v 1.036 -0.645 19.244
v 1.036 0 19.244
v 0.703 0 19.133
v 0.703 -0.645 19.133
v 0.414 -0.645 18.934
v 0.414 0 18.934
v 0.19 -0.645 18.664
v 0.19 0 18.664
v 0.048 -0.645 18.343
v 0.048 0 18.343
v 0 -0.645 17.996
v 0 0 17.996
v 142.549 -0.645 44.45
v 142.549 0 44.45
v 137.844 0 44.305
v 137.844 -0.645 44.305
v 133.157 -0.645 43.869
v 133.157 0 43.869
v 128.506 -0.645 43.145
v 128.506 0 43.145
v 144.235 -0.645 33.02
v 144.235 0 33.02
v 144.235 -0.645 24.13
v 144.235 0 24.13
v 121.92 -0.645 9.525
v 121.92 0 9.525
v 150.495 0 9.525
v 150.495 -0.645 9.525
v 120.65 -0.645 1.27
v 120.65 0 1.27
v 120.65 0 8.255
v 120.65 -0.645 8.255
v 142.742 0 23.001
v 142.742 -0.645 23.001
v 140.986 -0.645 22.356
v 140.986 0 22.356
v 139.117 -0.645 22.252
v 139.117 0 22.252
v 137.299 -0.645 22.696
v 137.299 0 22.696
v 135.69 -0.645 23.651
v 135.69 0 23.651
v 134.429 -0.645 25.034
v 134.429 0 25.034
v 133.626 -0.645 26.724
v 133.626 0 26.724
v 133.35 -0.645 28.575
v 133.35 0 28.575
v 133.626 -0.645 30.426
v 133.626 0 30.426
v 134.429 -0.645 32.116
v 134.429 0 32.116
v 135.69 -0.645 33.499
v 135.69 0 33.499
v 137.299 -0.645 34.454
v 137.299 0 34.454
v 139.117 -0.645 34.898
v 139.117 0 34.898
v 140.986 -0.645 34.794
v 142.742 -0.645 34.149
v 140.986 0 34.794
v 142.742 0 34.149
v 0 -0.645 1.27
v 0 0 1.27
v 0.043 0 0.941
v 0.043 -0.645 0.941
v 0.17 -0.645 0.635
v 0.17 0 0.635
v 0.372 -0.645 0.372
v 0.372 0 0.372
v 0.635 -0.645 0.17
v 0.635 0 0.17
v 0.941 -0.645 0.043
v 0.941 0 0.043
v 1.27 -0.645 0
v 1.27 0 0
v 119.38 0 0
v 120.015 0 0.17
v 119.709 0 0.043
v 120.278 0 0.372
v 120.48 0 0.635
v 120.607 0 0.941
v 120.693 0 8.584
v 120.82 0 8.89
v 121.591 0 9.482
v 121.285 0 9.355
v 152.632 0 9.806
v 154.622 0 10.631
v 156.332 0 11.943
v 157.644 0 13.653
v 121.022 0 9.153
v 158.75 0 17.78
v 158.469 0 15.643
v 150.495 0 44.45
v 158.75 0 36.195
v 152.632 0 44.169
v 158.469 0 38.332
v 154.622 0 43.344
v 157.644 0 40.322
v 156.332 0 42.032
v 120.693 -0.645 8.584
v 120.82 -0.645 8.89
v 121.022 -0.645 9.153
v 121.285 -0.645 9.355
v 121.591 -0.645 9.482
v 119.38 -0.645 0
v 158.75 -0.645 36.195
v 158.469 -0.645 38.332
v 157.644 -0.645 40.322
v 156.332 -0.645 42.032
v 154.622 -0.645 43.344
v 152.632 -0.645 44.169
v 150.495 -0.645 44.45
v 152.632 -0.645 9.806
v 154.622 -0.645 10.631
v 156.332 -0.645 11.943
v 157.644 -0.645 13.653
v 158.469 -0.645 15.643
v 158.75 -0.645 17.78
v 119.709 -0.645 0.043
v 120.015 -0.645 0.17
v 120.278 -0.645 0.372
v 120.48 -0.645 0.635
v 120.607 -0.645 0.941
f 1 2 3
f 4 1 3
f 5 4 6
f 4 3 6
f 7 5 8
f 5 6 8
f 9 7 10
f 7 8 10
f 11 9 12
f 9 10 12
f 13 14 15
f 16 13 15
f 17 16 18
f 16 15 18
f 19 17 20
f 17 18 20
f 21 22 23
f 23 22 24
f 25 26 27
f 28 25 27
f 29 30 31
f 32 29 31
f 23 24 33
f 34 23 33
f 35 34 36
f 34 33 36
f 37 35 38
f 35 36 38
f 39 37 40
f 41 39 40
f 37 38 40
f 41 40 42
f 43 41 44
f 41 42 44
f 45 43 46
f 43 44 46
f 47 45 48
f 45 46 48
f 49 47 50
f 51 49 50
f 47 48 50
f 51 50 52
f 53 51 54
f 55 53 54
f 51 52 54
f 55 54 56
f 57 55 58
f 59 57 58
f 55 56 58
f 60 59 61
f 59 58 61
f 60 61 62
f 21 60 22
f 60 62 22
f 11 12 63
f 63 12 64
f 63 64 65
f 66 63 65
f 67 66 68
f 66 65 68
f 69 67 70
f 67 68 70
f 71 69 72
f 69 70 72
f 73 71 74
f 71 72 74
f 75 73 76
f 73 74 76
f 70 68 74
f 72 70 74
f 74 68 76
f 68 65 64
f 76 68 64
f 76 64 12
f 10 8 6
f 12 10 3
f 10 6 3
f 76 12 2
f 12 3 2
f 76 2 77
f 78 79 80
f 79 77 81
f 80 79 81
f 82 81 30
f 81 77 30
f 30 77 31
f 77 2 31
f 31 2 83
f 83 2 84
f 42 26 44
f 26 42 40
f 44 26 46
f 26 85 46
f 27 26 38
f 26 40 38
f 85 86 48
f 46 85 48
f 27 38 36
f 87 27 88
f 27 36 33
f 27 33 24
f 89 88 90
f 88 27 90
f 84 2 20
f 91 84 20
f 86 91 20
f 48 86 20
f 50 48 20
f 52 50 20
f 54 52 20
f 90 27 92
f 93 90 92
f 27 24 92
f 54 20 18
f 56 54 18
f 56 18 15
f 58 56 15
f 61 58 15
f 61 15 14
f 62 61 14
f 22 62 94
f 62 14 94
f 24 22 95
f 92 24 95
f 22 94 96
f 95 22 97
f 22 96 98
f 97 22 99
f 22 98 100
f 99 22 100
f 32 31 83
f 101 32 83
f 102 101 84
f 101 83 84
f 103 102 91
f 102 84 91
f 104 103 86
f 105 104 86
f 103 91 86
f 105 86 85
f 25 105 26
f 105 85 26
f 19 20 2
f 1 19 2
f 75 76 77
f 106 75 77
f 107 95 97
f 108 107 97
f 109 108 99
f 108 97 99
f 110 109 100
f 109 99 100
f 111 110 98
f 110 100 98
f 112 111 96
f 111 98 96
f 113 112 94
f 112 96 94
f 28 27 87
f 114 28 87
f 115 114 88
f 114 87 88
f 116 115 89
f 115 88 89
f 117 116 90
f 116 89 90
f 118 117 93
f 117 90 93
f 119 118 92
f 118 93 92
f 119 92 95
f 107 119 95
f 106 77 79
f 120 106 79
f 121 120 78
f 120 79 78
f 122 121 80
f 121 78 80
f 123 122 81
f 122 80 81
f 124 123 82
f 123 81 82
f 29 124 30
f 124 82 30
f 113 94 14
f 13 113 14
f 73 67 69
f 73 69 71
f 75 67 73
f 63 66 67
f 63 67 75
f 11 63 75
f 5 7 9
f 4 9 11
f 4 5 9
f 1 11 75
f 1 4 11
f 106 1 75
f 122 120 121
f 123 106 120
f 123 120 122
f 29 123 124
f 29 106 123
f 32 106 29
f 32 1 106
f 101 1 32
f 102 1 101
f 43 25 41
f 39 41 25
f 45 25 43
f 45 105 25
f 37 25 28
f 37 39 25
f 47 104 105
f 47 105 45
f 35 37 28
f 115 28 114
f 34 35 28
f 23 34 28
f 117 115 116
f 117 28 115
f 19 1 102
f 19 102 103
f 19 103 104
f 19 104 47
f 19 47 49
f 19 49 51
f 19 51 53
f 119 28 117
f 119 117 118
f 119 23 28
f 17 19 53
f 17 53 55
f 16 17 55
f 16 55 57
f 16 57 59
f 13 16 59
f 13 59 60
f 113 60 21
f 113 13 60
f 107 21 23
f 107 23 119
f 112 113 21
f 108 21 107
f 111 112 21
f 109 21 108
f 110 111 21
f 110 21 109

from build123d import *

# Parameters (mm, degrees)
F1_DEPTH = 0.64516


with BuildPart() as f1:
    # F0 (on Front) → F1 (new body)
    with BuildSketch(Plane.XZ):
        with BuildLine():
            ThreePointArc((0, 1.27), (0.371974, 0.371974), (1.27, 0))
            Line((1.27, 0), (119.38, 0))
            ThreePointArc((119.38, 0), (120.278026, 0.371974), (120.65, 1.27))
            Line((120.65, 1.27), (120.65, 8.255))
            ThreePointArc((120.65, 8.255), (121.021974, 9.153026), (121.92, 9.525))
            Line((121.92, 9.525), (150.495, 9.525))
            ThreePointArc((150.495, 9.525), (156.332166, 11.942834), (158.75, 17.78))
            Line((158.75, 17.78), (158.75, 36.195))
            ThreePointArc((158.75, 36.195), (156.332166, 42.032166), (150.495, 44.45))
            Line((150.495, 44.45), (142.54871, 44.45))
            ThreePointArc((142.54871, 44.45), (135.497057, 44.123014), (128.505923, 43.144861))
            Line((128.505923, 43.144861), (1.035954, 19.244241))
            ThreePointArc((1.035954, 19.244241), (0.292723, 18.807061), (0, 17.995994))
            Line((0, 17.995994), (0, 1.27))
        make_face()
        with BuildLine():
            ThreePointArc((144.234807, 24.13), (133.35, 28.575), (144.234807, 33.02))
            Line((144.234807, 33.02), (144.234807, 24.13))
        make_face(mode=Mode.SUBTRACT)
    extrude(amount=F1_DEPTH)


solid = f1.part
